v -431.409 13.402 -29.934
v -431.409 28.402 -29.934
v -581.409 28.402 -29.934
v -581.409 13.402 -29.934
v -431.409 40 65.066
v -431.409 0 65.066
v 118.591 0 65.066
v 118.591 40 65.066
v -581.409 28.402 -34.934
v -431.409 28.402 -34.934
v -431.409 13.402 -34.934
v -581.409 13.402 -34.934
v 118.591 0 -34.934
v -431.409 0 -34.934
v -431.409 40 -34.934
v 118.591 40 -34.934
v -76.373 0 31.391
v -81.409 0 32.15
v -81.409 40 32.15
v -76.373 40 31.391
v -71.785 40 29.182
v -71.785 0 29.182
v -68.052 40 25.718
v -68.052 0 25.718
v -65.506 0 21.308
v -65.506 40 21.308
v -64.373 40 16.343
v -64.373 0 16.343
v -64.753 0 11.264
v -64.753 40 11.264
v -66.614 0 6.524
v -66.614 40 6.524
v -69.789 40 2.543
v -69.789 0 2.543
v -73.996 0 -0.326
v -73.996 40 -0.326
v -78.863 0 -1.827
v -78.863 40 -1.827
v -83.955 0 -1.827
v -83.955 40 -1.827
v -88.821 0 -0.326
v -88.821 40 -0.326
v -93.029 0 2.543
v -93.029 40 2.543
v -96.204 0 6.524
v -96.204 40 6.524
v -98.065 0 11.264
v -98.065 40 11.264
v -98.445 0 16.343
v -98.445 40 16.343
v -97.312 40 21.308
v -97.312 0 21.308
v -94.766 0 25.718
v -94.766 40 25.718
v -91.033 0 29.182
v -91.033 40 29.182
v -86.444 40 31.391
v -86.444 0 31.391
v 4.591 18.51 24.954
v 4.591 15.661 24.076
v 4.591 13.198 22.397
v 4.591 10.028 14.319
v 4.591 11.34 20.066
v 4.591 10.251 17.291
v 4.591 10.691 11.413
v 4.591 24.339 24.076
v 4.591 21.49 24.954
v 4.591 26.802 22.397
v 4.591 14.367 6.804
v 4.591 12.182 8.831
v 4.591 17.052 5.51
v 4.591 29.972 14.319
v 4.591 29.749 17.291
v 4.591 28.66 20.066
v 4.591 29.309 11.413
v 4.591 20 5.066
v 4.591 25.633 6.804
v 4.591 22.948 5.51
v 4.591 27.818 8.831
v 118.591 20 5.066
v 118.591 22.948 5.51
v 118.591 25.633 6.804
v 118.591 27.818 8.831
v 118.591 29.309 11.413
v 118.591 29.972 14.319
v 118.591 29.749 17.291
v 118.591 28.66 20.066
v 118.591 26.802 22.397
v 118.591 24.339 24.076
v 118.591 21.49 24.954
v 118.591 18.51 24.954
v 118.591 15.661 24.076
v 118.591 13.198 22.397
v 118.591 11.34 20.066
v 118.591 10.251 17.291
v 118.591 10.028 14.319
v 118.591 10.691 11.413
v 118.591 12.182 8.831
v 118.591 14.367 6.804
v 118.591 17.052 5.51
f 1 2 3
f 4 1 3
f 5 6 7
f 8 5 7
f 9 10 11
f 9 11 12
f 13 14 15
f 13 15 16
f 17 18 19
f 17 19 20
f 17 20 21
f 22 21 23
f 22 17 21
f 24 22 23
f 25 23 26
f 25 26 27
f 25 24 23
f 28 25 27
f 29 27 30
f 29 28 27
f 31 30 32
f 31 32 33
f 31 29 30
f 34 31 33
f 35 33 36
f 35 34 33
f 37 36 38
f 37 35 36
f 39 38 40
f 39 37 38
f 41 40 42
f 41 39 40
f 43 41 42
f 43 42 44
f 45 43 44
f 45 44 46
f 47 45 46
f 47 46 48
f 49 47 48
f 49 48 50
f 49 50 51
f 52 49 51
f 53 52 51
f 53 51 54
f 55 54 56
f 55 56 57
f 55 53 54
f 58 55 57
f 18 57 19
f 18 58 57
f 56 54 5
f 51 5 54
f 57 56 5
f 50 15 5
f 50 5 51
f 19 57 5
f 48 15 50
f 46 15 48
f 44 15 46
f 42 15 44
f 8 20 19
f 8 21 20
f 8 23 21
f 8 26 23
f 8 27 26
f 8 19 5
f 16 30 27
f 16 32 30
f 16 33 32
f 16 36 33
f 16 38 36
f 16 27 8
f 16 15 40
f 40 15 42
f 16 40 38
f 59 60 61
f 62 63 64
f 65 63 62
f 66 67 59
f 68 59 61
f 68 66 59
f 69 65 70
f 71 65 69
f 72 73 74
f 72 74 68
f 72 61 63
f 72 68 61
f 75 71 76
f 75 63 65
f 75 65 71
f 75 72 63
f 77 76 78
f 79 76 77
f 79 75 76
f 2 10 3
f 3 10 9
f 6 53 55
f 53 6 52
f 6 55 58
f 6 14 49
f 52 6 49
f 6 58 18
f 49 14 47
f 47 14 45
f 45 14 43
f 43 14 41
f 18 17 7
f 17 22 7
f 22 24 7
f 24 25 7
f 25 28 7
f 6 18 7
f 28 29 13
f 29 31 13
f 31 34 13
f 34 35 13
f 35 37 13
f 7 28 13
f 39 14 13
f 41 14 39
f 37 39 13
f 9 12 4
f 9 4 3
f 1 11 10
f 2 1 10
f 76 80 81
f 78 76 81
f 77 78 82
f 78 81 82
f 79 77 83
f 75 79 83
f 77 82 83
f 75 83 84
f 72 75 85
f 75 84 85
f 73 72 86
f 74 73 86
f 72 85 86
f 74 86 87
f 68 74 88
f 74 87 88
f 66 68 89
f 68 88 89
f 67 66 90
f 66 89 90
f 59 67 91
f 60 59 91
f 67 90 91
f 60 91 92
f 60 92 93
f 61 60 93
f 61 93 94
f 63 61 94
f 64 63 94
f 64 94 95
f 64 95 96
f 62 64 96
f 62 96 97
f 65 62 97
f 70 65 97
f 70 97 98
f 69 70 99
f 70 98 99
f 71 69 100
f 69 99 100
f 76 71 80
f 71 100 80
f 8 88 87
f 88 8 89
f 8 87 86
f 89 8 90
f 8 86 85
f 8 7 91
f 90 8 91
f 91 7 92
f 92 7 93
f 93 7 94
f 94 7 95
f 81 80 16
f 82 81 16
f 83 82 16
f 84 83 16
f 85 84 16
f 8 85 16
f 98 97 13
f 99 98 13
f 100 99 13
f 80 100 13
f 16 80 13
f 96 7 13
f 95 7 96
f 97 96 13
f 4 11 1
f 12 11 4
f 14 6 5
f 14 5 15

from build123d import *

# Parameters (mm, degrees)
SKETCH1_W           = 550
SKETCH1_H           = 100
SKETCH1_R           = 17.084029422
BOSS_EXTRUDE1_DEPTH = 40
SKETCH2_R           = 10
CUT_EXTRUDE1_DEPTH  = 114
SKETCH3_W           = 150
SKETCH3_H           = 15
BOSS_EXTRUDE2_DEPTH = 5


with BuildPart() as part:
    # Sketch1 → Boss-Extrude1 (new body)
    with BuildSketch(Plane(origin=(0, 0, 0), x_dir=(1, 0, 0), z_dir=(0, 1, 0))):
        with Locations((-156.408850848, -15.066043846)):
            Rectangle(SKETCH1_W, SKETCH1_H)
        with Locations(Location((-81.408850848, -15.066043846, 0), (0, 0, 270))):
            Circle(SKETCH1_R, mode=Mode.SUBTRACT)
    extrude(amount=BOSS_EXTRUDE1_DEPTH)

    # Sketch2 → Cut-Extrude1 (cut)
    with BuildSketch(Plane(origin=(118.591149152, 0, 0), x_dir=(0, 0, -1), z_dir=(1, 0, 0))):
        with Locations((-15.066043846, 20)):
            Circle(SKETCH2_R)
    extrude(amount=-CUT_EXTRUDE1_DEPTH, mode=Mode.SUBTRACT)


with BuildPart() as body_2:
    # Sketch3 → Boss-Extrude2 (new body)
    with BuildSketch(Plane(origin=(0, 0, -34.933956154), x_dir=(-1, 0, 0), z_dir=(0, 0, -1))):
        with Locations((506.408850848, 20.90171756)):
            Rectangle(SKETCH3_W, SKETCH3_H)
    extrude(amount=-BOSS_EXTRUDE2_DEPTH)


solid = Compound([part.part, body_2.part])
